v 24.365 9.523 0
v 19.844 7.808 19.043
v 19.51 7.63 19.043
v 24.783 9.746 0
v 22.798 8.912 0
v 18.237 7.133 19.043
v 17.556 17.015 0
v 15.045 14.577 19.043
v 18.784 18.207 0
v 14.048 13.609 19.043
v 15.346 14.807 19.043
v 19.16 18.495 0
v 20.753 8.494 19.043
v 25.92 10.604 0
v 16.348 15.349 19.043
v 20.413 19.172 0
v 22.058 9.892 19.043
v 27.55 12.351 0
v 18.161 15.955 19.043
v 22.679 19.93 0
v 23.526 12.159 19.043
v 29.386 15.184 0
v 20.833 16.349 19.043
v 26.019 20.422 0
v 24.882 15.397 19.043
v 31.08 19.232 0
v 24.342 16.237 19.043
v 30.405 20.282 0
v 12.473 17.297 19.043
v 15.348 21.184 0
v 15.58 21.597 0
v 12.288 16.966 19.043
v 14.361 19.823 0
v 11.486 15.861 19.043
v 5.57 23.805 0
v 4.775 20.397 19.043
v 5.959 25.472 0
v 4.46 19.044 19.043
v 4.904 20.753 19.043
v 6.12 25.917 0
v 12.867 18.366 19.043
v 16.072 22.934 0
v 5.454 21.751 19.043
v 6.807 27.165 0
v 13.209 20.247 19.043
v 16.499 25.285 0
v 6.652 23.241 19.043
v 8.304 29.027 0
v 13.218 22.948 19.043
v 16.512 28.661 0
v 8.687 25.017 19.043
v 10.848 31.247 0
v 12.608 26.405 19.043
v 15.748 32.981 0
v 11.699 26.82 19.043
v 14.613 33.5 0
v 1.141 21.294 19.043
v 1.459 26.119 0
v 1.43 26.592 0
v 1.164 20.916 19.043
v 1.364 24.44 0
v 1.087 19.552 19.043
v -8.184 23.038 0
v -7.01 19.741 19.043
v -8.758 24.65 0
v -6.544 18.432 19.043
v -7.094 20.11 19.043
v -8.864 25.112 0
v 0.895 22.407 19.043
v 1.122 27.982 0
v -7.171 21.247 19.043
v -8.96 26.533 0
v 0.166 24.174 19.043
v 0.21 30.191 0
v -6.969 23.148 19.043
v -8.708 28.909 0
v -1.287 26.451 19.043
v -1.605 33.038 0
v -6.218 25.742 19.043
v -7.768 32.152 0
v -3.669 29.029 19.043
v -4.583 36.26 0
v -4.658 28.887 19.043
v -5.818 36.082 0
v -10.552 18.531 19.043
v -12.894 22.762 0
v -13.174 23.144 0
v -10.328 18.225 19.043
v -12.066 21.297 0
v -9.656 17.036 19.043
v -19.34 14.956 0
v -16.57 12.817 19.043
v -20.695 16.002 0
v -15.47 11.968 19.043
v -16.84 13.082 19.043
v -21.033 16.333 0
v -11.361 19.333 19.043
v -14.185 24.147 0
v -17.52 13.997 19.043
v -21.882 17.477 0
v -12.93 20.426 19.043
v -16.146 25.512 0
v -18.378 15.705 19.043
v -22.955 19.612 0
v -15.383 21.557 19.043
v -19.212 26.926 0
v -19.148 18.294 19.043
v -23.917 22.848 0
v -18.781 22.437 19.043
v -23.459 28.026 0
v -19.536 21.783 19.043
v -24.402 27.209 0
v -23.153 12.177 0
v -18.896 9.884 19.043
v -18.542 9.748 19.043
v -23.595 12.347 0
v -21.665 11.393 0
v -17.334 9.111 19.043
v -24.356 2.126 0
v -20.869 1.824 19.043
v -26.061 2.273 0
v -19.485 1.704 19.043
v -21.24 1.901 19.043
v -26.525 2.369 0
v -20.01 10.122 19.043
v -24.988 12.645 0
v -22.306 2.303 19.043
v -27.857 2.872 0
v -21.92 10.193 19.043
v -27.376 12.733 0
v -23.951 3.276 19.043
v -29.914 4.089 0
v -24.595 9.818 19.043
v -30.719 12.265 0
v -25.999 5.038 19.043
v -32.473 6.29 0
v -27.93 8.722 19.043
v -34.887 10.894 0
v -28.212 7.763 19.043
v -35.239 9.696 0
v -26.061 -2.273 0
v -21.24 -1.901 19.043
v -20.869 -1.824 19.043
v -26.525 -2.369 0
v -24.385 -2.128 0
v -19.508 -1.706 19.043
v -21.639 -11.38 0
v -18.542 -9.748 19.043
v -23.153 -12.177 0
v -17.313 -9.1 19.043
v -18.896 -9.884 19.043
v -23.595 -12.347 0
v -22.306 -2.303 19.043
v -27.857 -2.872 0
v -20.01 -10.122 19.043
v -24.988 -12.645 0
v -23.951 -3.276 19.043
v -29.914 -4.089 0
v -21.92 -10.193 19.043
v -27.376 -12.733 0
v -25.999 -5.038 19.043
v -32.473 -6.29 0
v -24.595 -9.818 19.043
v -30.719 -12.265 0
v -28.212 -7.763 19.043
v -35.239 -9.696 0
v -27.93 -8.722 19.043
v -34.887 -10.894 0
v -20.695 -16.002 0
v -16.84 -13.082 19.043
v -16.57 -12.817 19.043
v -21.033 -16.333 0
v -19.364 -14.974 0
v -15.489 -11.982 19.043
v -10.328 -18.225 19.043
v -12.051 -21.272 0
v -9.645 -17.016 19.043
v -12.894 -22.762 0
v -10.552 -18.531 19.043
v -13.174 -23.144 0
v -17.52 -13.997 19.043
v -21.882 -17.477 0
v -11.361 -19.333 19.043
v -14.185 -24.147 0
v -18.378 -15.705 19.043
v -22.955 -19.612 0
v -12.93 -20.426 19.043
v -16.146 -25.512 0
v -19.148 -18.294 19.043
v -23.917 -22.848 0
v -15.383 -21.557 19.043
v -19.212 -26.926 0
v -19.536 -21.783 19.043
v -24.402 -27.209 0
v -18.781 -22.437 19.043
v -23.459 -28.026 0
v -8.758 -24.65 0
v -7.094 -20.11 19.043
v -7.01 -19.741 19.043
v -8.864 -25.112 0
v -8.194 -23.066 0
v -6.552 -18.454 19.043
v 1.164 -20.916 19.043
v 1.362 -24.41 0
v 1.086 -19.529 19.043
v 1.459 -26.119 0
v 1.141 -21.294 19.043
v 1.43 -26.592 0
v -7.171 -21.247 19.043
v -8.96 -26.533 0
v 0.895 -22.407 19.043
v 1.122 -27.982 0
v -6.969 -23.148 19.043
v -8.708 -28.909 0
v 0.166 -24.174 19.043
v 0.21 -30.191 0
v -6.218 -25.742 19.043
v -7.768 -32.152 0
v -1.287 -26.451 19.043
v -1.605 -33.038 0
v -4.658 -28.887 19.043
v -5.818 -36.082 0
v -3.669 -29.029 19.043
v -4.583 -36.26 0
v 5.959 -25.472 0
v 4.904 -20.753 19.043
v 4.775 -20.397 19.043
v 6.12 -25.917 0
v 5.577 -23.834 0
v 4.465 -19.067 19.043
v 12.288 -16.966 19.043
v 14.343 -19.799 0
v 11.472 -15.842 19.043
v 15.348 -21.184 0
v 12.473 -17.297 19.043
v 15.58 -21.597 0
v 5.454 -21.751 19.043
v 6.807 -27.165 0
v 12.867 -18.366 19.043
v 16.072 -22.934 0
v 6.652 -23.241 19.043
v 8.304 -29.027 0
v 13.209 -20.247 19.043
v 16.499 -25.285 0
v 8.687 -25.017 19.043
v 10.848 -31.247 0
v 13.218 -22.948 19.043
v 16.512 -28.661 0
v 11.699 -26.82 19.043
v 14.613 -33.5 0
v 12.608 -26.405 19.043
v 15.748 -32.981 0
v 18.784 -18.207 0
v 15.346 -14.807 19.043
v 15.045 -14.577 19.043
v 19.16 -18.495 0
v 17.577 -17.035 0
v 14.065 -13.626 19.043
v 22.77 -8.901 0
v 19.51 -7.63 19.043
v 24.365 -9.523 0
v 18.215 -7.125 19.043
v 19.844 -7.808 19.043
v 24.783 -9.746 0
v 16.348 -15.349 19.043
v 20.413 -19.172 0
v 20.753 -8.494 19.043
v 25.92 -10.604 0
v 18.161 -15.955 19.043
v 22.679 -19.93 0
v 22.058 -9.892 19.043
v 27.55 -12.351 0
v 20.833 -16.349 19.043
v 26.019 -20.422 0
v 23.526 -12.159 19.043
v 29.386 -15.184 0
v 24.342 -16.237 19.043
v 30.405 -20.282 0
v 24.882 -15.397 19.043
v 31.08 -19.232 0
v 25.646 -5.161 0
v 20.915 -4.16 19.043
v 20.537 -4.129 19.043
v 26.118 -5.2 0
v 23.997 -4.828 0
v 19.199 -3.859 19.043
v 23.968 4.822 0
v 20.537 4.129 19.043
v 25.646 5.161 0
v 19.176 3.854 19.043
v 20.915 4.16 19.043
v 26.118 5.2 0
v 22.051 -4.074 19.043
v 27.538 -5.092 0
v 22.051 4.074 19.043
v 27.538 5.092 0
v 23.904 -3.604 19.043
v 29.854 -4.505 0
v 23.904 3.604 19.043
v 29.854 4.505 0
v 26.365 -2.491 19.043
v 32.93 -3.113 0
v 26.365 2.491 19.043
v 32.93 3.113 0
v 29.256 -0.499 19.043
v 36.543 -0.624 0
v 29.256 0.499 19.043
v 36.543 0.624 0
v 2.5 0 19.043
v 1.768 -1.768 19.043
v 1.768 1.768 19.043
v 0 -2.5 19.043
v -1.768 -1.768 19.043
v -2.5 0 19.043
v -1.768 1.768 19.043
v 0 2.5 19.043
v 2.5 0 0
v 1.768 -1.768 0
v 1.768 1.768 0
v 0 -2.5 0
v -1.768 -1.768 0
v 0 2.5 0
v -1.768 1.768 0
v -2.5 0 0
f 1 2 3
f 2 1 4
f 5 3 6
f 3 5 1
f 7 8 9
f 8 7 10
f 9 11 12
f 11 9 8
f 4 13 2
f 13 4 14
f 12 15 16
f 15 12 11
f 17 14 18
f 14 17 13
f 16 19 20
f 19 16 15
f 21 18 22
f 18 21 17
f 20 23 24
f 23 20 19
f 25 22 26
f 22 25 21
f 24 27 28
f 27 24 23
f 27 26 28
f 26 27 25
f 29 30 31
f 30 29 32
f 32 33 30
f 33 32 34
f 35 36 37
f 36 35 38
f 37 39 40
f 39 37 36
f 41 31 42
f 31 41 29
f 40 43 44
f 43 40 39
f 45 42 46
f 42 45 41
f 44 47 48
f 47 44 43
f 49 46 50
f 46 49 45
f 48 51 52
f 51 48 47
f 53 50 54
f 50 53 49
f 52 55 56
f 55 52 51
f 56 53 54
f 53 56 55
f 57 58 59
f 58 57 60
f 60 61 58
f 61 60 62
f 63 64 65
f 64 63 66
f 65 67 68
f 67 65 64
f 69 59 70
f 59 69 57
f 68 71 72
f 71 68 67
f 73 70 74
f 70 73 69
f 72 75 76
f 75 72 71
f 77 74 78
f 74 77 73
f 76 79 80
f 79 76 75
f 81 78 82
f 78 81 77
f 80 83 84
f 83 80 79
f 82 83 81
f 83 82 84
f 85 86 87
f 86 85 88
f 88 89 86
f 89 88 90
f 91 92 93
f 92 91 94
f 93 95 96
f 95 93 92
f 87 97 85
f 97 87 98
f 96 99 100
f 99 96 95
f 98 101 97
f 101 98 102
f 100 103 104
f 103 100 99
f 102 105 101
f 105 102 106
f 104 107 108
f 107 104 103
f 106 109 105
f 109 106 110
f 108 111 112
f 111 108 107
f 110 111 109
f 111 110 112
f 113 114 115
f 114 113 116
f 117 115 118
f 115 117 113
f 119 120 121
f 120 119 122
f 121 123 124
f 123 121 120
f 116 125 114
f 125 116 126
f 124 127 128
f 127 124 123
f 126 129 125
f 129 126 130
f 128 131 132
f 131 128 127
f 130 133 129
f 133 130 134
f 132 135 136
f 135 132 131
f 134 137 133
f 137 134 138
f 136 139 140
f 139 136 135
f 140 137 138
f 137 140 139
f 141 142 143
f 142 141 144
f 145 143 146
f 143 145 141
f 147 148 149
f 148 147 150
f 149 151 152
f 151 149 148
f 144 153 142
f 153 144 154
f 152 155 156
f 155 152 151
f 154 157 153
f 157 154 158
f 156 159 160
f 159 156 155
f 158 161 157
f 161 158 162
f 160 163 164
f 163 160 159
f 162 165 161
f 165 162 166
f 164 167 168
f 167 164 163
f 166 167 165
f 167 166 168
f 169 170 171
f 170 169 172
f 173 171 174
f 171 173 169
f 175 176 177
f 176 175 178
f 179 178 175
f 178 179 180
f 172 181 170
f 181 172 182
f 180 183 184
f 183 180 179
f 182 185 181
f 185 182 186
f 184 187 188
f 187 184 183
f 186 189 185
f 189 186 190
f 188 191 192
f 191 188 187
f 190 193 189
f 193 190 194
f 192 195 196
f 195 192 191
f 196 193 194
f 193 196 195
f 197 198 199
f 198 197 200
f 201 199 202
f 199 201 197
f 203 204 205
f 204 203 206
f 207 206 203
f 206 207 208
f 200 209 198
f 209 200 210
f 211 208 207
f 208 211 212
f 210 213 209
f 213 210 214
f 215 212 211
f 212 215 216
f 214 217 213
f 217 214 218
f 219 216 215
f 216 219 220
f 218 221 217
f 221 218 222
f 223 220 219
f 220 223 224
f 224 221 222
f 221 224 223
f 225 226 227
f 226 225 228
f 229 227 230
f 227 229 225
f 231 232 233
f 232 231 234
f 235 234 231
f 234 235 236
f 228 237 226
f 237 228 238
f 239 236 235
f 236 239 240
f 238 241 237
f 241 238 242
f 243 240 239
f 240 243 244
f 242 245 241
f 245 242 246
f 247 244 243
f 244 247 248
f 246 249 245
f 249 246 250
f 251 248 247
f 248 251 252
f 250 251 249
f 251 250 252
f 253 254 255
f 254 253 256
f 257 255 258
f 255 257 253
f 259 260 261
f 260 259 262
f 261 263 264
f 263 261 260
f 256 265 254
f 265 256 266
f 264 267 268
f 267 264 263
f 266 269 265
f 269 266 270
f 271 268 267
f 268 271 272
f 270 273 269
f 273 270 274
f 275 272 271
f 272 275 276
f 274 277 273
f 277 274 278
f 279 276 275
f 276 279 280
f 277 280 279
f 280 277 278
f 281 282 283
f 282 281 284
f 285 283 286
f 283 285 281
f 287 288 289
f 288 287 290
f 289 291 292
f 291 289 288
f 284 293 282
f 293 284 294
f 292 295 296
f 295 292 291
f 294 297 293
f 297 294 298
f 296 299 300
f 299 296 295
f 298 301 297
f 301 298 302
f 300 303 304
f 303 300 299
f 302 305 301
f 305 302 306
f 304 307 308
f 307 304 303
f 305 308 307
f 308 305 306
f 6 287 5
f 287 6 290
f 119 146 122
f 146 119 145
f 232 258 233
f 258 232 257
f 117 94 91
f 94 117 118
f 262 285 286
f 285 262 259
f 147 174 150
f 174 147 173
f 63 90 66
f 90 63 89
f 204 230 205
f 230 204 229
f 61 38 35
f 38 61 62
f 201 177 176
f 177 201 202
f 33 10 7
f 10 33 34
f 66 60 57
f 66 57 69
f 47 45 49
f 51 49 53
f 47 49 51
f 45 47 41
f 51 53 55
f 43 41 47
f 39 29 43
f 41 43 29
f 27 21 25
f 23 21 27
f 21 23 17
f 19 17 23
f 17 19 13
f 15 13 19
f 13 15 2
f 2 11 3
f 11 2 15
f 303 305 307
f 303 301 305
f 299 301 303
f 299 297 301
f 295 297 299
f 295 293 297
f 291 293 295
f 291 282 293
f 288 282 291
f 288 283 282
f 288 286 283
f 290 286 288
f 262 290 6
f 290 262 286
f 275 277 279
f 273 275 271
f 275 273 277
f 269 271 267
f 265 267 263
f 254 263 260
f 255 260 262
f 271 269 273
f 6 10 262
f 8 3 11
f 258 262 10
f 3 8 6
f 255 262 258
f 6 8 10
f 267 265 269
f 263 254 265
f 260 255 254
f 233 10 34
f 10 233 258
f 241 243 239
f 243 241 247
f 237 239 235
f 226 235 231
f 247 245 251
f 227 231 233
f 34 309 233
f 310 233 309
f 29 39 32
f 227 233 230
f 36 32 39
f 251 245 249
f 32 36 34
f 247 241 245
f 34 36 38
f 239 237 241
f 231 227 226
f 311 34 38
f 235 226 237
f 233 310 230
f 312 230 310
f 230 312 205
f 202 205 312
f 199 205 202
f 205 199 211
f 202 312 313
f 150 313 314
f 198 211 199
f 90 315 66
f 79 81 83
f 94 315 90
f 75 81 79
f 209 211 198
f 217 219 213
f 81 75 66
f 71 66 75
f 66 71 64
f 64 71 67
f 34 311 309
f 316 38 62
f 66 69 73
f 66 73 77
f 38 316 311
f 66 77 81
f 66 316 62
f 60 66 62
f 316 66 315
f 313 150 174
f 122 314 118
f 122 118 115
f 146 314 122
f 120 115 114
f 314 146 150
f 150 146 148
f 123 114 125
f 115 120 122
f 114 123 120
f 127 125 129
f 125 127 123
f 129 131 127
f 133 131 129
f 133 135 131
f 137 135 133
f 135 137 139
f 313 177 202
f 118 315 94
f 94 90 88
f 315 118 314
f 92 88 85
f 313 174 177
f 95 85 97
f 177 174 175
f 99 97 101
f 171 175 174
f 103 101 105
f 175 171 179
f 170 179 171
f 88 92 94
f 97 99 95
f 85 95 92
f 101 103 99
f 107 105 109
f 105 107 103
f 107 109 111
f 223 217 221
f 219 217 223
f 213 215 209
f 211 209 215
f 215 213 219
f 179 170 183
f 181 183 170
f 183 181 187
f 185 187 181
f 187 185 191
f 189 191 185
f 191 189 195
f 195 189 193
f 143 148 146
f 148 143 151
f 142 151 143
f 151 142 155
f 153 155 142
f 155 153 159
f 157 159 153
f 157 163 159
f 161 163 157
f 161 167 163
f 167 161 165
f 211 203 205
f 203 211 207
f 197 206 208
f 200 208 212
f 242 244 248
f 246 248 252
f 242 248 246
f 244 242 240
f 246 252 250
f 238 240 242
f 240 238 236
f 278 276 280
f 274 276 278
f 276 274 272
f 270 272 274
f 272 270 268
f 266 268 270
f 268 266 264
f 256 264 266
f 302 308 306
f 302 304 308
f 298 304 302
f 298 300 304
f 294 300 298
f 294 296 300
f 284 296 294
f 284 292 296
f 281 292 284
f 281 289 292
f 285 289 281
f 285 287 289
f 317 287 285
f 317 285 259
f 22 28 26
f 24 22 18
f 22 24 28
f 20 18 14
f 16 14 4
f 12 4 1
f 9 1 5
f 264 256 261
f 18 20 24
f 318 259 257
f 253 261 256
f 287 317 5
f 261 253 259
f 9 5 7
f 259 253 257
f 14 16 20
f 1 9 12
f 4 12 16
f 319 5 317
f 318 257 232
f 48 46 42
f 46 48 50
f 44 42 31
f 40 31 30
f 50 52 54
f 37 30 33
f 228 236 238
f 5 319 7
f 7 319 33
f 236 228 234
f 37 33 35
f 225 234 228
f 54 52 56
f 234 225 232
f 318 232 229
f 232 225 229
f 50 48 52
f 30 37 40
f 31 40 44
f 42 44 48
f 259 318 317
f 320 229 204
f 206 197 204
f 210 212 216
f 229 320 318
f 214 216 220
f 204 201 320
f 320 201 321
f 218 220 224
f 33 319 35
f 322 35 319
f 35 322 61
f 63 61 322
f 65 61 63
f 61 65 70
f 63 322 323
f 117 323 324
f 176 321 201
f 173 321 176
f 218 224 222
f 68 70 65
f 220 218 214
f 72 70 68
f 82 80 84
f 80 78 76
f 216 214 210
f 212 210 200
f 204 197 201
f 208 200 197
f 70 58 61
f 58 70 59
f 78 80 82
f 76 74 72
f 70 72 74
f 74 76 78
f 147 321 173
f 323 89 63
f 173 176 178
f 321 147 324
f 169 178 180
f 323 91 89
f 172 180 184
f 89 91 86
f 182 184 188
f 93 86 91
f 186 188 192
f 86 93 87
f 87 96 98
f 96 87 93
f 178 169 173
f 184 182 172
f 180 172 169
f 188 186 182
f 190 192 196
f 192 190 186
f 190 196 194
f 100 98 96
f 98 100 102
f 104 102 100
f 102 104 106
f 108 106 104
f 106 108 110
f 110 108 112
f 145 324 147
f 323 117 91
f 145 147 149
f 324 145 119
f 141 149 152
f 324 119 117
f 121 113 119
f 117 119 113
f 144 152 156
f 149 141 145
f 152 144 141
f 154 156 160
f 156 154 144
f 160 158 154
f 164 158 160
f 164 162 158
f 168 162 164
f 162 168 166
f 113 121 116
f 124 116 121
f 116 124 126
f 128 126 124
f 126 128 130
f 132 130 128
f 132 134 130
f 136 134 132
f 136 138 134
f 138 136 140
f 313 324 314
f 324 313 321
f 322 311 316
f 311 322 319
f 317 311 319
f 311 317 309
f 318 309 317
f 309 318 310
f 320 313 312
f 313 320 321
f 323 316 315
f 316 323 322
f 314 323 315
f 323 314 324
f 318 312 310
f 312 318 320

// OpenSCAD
// Parametric Involute Bevel and Spur Gears by GregFrost
// It is licensed under the Creative Commons - GNU LGPL 2.1 license.
// © 2010 by GregFrost, thingiverse.com/Amp
// http://www.thingiverse.com/thing:3575 and http://www.thingiverse.com/thing:3752

// Simple Test:
//gear (circular_pitch=700,
//	gear_thickness = 12,
//	rim_thickness = 15,
//	hub_thickness = 17,
//	circles=8);

//Complex Spur Gear Test:
//test_gears ();

// Meshing Double Helix:
//test_meshing_double_helix ();

module test_meshing_double_helix(){
    meshing_double_helix ();
}

// Demonstrate the backlash option for Spur gears.
//test_backlash ();

// Demonstrate how to make meshing bevel gears.
//test_bevel_gear_pair();

module test_bevel_gear_pair(){
    bevel_gear_pair ();
}

//test_bevel_gear_pair();

module test_bevel_gear(){bevel_gear();}

bevel_gear();

pi=3.1415926535897932384626433832795;

//==================================================
// Bevel Gears:
// Two gears with the same cone distance, circular pitch (measured at the cone distance)
// and pressure angle will mesh.

module bevel_gear_pair (
	gear1_teeth = 41,
	gear2_teeth = 7,
	axis_angle = 90,
	outside_circular_pitch=1000)
{
	outside_pitch_radius1 = gear1_teeth * outside_circular_pitch / 360;
	outside_pitch_radius2 = gear2_teeth * outside_circular_pitch / 360;
	pitch_apex1=outside_pitch_radius2 * sin (axis_angle) +
		(outside_pitch_radius2 * cos (axis_angle) + outside_pitch_radius1) / tan (axis_angle);
	cone_distance = sqrt (pow (pitch_apex1, 2) + pow (outside_pitch_radius1, 2));
	pitch_apex2 = sqrt (pow (cone_distance, 2) - pow (outside_pitch_radius2, 2));
	echo ("cone_distance", cone_distance);
	pitch_angle1 = asin (outside_pitch_radius1 / cone_distance);
	pitch_angle2 = asin (outside_pitch_radius2 / cone_distance);
	echo ("pitch_angle1, pitch_angle2", pitch_angle1, pitch_angle2);
	echo ("pitch_angle1 + pitch_angle2", pitch_angle1 + pitch_angle2);

	rotate([0,0,90])
	translate ([0,0,pitch_apex1+20])
	{
		translate([0,0,-pitch_apex1])
		bevel_gear (
			number_of_teeth=gear1_teeth,
			cone_distance=cone_distance,
			pressure_angle=30,
			outside_circular_pitch=outside_circular_pitch);

		rotate([0,-(pitch_angle1+pitch_angle2),0])
		translate([0,0,-pitch_apex2])
		bevel_gear (
			number_of_teeth=gear2_teeth,
			cone_distance=cone_distance,
			pressure_angle=30,
			outside_circular_pitch=outside_circular_pitch);
	}
}

//Bevel Gear Finishing Options:
bevel_gear_flat = 0;
bevel_gear_back_cone = 1;

module bevel_gear (
	number_of_teeth=11,
	cone_distance=100,
	face_width=20,
	outside_circular_pitch=1000,
	pressure_angle=30,
	clearance = 0.2,
	bore_diameter=5,
	gear_thickness = 15,
	backlash = 0,
	involute_facets=0,
	finish = -1)
{
	echo ("bevel_gear",
		"teeth", number_of_teeth,
		"cone distance", cone_distance,
		face_width,
		outside_circular_pitch,
		pressure_angle,
		clearance,
		bore_diameter,
		involute_facets,
		finish);

	// Pitch diameter: Diameter of pitch circle at the fat end of the gear.
	outside_pitch_diameter  =  number_of_teeth * outside_circular_pitch / 180;
	outside_pitch_radius = outside_pitch_diameter / 2;

	// The height of the pitch apex.
	pitch_apex = sqrt (pow (cone_distance, 2) - pow (outside_pitch_radius, 2));
	pitch_angle = asin (outside_pitch_radius/cone_distance);

	echo ("Num Teeth:", number_of_teeth, " Pitch Angle:", pitch_angle);

	finish = (finish != -1) ? finish : (pitch_angle < 45) ? bevel_gear_flat : bevel_gear_back_cone;

	apex_to_apex=cone_distance / cos (pitch_angle);
	back_cone_radius = apex_to_apex * sin (pitch_angle);

	// Calculate and display the pitch angle. This is needed to determine the angle to mount two meshing cone gears.

	// Base Circle for forming the involute teeth shape.
	base_radius = back_cone_radius * cos (pressure_angle);

	// Diametrial pitch: Number of teeth per unit length.
	pitch_diametrial = number_of_teeth / outside_pitch_diameter;

	// Addendum: Radial distance from pitch circle to outside circle.
	addendum = 1 / pitch_diametrial;
	// Outer Circle
	outer_radius = back_cone_radius + addendum;

	// Dedendum: Radial distance from pitch circle to root diameter
	dedendum = addendum + clearance;
	dedendum_angle = atan (dedendum / cone_distance);
	root_angle = pitch_angle - dedendum_angle;

	root_cone_full_radius = tan (root_angle)*apex_to_apex;
	back_cone_full_radius=apex_to_apex / tan (pitch_angle);

	back_cone_end_radius =
		outside_pitch_radius -
		dedendum * cos (pitch_angle) -
		gear_thickness / tan (pitch_angle);
	back_cone_descent = dedendum * sin (pitch_angle) + gear_thickness;

	// Root diameter: Diameter of bottom of tooth spaces.
	root_radius = back_cone_radius - dedendum;

	half_tooth_thickness = outside_pitch_radius * sin (360 / (4 * number_of_teeth)) - backlash / 4;
	half_thick_angle = asin (half_tooth_thickness / back_cone_radius);

	face_cone_height = apex_to_apex-face_width / cos (pitch_angle);
	face_cone_full_radius = face_cone_height / tan (pitch_angle);
	face_cone_descent = dedendum * sin (pitch_angle);
	face_cone_end_radius =
		outside_pitch_radius -
		face_width / sin (pitch_angle) -
		face_cone_descent / tan (pitch_angle);

	// For the bevel_gear_flat finish option, calculate the height of a cube to select the portion of the gear that includes the full pitch face.
	bevel_gear_flat_height = pitch_apex - (cone_distance - face_width) * cos (pitch_angle);

//	translate([0,0,-pitch_apex])
	difference ()
	{
		intersection ()
		{
			union()
			{
				rotate (half_thick_angle)
				translate ([0,0,pitch_apex-apex_to_apex])
				cylinder ($fn=number_of_teeth*2, r1=root_cone_full_radius,r2=0,h=apex_to_apex);
				for (i = [1:number_of_teeth])
//				for (i = [1:1])
				{
					rotate ([0,0,i*360/number_of_teeth])
					{
						involute_bevel_gear_tooth (
							back_cone_radius = back_cone_radius,
							root_radius = root_radius,
							base_radius = base_radius,
							outer_radius = outer_radius,
							pitch_apex = pitch_apex,
							cone_distance = cone_distance,
							half_thick_angle = half_thick_angle,
							involute_facets = involute_facets);
					}
				}
			}

			if (finish == bevel_gear_back_cone)
			{
				translate ([0,0,-back_cone_descent])
				cylinder (
					$fn=number_of_teeth*2,
					r1=back_cone_end_radius,
					r2=back_cone_full_radius*2,
					h=apex_to_apex + back_cone_descent);
			}
			else
			{
				translate ([-1.5*outside_pitch_radius,-1.5*outside_pitch_radius,0])
				cube ([3*outside_pitch_radius,
					3*outside_pitch_radius,
					bevel_gear_flat_height]);
			}
		}

		if (finish == bevel_gear_back_cone)
		{
			translate ([0,0,-face_cone_descent])
			cylinder (
				r1=face_cone_end_radius,
				r2=face_cone_full_radius * 2,
				h=face_cone_height + face_cone_descent+pitch_apex);
		}

		translate ([0,0,pitch_apex - apex_to_apex])
		cylinder (r=bore_diameter/2,h=apex_to_apex);
	}
}

module involute_bevel_gear_tooth (
	back_cone_radius,
	root_radius,
	base_radius,
	outer_radius,
	pitch_apex,
	cone_distance,
	half_thick_angle,
	involute_facets)
{
//	echo ("involute_bevel_gear_tooth",
//		back_cone_radius,
//		root_radius,
//		base_radius,
//		outer_radius,
//		pitch_apex,
//		cone_distance,
//		half_thick_angle);

	min_radius = max (base_radius*2,root_radius*2);

	pitch_point =
		involute (
			base_radius*2,
			involute_intersect_angle (base_radius*2, back_cone_radius*2));
	pitch_angle = atan2 (pitch_point[1], pitch_point[0]);
	centre_angle = pitch_angle + half_thick_angle;

	start_angle = involute_intersect_angle (base_radius*2, min_radius);
	stop_angle = involute_intersect_angle (base_radius*2, outer_radius*2);

	res=(involute_facets!=0)?involute_facets:($fn==0)?5:$fn/4;

	translate ([0,0,pitch_apex])
	rotate ([0,-atan(back_cone_radius/cone_distance),0])
	translate ([-back_cone_radius*2,0,-cone_distance*2])
	union ()
	{
		for (i=[1:res])
		{
			assign (
				point1=
					involute (base_radius*2,start_angle+(stop_angle - start_angle)*(i-1)/res),
				point2=
					involute (base_radius*2,start_angle+(stop_angle - start_angle)*(i)/res))
			{
				assign (
					side1_point1 = rotate_point (centre_angle, point1),
					side1_point2 = rotate_point (centre_angle, point2),
					side2_point1 = mirror_point (rotate_point (centre_angle, point1)),
					side2_point2 = mirror_point (rotate_point (centre_angle, point2)))
				{
					polyhedron (
						points=[
							[back_cone_radius*2+0.1,0,cone_distance*2],
							[side1_point1[0],side1_point1[1],0],
							[side1_point2[0],side1_point2[1],0],
							[side2_point2[0],side2_point2[1],0],
							[side2_point1[0],side2_point1[1],0],
							[0.1,0,0]],
						triangles=[[0,2,1],[0,3,2],[0,4,3],[0,1,5],[1,2,5],[2,3,5],[3,4,5],[0,5,4]]);
				}
			}
		}
	}
}

module gear (
	number_of_teeth=15,
	circular_pitch=false, diametral_pitch=false,
	pressure_angle=28,
	clearance = 0.2,
	gear_thickness=5,
	rim_thickness=8,
	rim_width=5,
	hub_thickness=10,
	hub_diameter=15,
	bore_diameter=5,
	circles=0,
	backlash=0,
	twist=0,
	involute_facets=0,
	flat=false)
{
	if (circular_pitch==false && diametral_pitch==false)
		echo("MCAD ERROR: gear module needs either a diametral_pitch or circular_pitch");

	//Convert diametrial pitch to our native circular pitch
	circular_pitch = (circular_pitch!=false?circular_pitch:180/diametral_pitch);

	// Pitch diameter: Diameter of pitch circle.
	pitch_diameter  =  number_of_teeth * circular_pitch / 180;
	pitch_radius = pitch_diameter/2;
	echo ("Teeth:", number_of_teeth, " Pitch radius:", pitch_radius);

	// Base Circle
	base_radius = pitch_radius*cos(pressure_angle);

	// Diametrial pitch: Number of teeth per unit length.
	pitch_diametrial = number_of_teeth / pitch_diameter;

	// Addendum: Radial distance from pitch circle to outside circle.
	addendum = 1/pitch_diametrial;

	//Outer Circle
	outer_radius = pitch_radius+addendum;

	// Dedendum: Radial distance from pitch circle to root diameter
	dedendum = addendum + clearance;

	// Root diameter: Diameter of bottom of tooth spaces.
	root_radius = pitch_radius-dedendum;
	backlash_angle = backlash / pitch_radius * 180 / pi;
	half_thick_angle = (360 / number_of_teeth - backlash_angle) / 4;

	// Variables controlling the rim.
	rim_radius = root_radius - rim_width;

	// Variables controlling the circular holes in the gear.
	circle_orbit_diameter=hub_diameter/2+rim_radius;
	circle_orbit_curcumference=pi*circle_orbit_diameter;

	// Limit the circle size to 90% of the gear face.
	circle_diameter=
		min (
			0.70*circle_orbit_curcumference/circles,
			(rim_radius-hub_diameter/2)*0.9);

	difference()
	{
		union ()
		{
			difference ()
			{
				linear_exturde_flat_option(flat=flat, height=rim_thickness, convexity=10, twist=twist)
				gear_shape (
					number_of_teeth,
					pitch_radius = pitch_radius,
					root_radius = root_radius,
					base_radius = base_radius,
					outer_radius = outer_radius,
					half_thick_angle = half_thick_angle,
					involute_facets=involute_facets);

				if (gear_thickness < rim_thickness)
					translate ([0,0,gear_thickness])
					cylinder (r=rim_radius,h=rim_thickness-gear_thickness+1);
			}
			if (gear_thickness > rim_thickness)
				linear_exturde_flat_option(flat=flat, height=gear_thickness)
				circle (r=rim_radius);
			if (flat == false && hub_thickness > gear_thickness)
				translate ([0,0,gear_thickness])
				linear_exturde_flat_option(flat=flat, height=hub_thickness-gear_thickness)
				circle (r=hub_diameter/2);
		}
		translate ([0,0,-1])
		linear_exturde_flat_option(flat =flat, height=2+max(rim_thickness,hub_thickness,gear_thickness))
		circle (r=bore_diameter/2);
		if (circles>0)
		{
			for(i=[0:circles-1])
				rotate([0,0,i*360/circles])
				translate([circle_orbit_diameter/2,0,-1])
				linear_exturde_flat_option(flat =flat, height=max(gear_thickness,rim_thickness)+3)
				circle(r=circle_diameter/2);
		}
	}
}

module linear_exturde_flat_option(flat =false, height = 10, center = false, convexity = 2, twist = 0)
{
	if(flat==false)
	{
		linear_extrude(height = height, center = center, convexity = convexity, twist= twist) child(0);
	}
	else
	{
		child(0);
	}

}

module gear_shape (
	number_of_teeth,
	pitch_radius,
	root_radius,
	base_radius,
	outer_radius,
	half_thick_angle,
	involute_facets)
{
	union()
	{
		rotate (half_thick_angle) circle ($fn=number_of_teeth*2, r=root_radius);

		for (i = [1:number_of_teeth])
		{
			rotate ([0,0,i*360/number_of_teeth])
			{
				involute_gear_tooth (
					pitch_radius = pitch_radius,
					root_radius = root_radius,
					base_radius = base_radius,
					outer_radius = outer_radius,
					half_thick_angle = half_thick_angle,
					involute_facets=involute_facets);
			}
		}
	}
}

module involute_gear_tooth (
	pitch_radius,
	root_radius,
	base_radius,
	outer_radius,
	half_thick_angle,
	involute_facets)
{
	min_radius = max (base_radius,root_radius);

	pitch_point = involute (base_radius, involute_intersect_angle (base_radius, pitch_radius));
	pitch_angle = atan2 (pitch_point[1], pitch_point[0]);
	centre_angle = pitch_angle + half_thick_angle;

	start_angle = involute_intersect_angle (base_radius, min_radius);
	stop_angle = involute_intersect_angle (base_radius, outer_radius);

	res=(involute_facets!=0)?involute_facets:($fn==0)?5:$fn/4;

	union ()
	{
		for (i=[1:res])
		assign (
			point1=involute (base_radius,start_angle+(stop_angle - start_angle)*(i-1)/res),
			point2=involute (base_radius,start_angle+(stop_angle - start_angle)*i/res))
		{
			assign (
				side1_point1=rotate_point (centre_angle, point1),
				side1_point2=rotate_point (centre_angle, point2),
				side2_point1=mirror_point (rotate_point (centre_angle, point1)),
				side2_point2=mirror_point (rotate_point (centre_angle, point2)))
			{
				polygon (
					points=[[0,0],side1_point1,side1_point2,side2_point2,side2_point1],
					paths=[[0,1,2,3,4,0]]);
			}
		}
	}
}

// Mathematical Functions
//===============

// Finds the angle of the involute about the base radius at the given distance (radius) from it's center.
//source: http://www.mathhelpforum.com/math-help/geometry/136011-circle-involute-solving-y-any-given-x.html

function involute_intersect_angle (base_radius, radius) = sqrt (pow (radius/base_radius, 2) - 1) * 180 / pi;

// Calculate the involute position for a given base radius and involute angle.

function rotated_involute (rotate, base_radius, involute_angle) =
[
	cos (rotate) * involute (base_radius, involute_angle)[0] + sin (rotate) * involute (base_radius, involute_angle)[1],
	cos (rotate) * involute (base_radius, involute_angle)[1] - sin (rotate) * involute (base_radius, involute_angle)[0]
];

function mirror_point (coord) =
[
	coord[0],
	-coord[1]
];

function rotate_point (rotate, coord) =
[
	cos (rotate) * coord[0] + sin (rotate) * coord[1],
	cos (rotate) * coord[1] - sin (rotate) * coord[0]
];

function involute (base_radius, involute_angle) =
[
	base_radius*(cos (involute_angle) + involute_angle*pi/180*sin (involute_angle)),
	base_radius*(sin (involute_angle) - involute_angle*pi/180*cos (involute_angle))
];


// Test Cases
//===============

module test_gears()
{
	translate([17,-15])
	{
		gear (number_of_teeth=17,
			circular_pitch=500,
			circles=8);

		rotate ([0,0,360*4/17])
		translate ([39.088888,0,0])
		{
			gear (number_of_teeth=11,
				circular_pitch=500,
				hub_diameter=0,
				rim_width=65);
			translate ([0,0,8])
			{
				gear (number_of_teeth=6,
					circular_pitch=300,
					hub_diameter=0,
					rim_width=5,
					rim_thickness=6,
					pressure_angle=31);
				rotate ([0,0,360*5/6])
				translate ([22.5,0,1])
				gear (number_of_teeth=21,
					circular_pitch=300,
					bore_diameter=2,
					hub_diameter=4,
					rim_width=1,
					hub_thickness=4,
					rim_thickness=4,
					gear_thickness=3,
					pressure_angle=31);
			}
		}

		translate ([-61.1111111,0,0])
		{
			gear (number_of_teeth=27,
				circular_pitch=500,
				circles=5,
				hub_diameter=2*8.88888889);

			translate ([0,0,10])
			{
				gear (
					number_of_teeth=14,
					circular_pitch=200,
					pressure_angle=5,
					clearance = 0.2,
					gear_thickness = 10,
					rim_thickness = 10,
					rim_width = 15,
					bore_diameter=5,
					circles=0);
				translate ([13.8888888,0,1])
				gear (
					number_of_teeth=11,
					circular_pitch=200,
					pressure_angle=5,
					clearance = 0.2,
					gear_thickness = 10,
					rim_thickness = 10,
					rim_width = 15,
					hub_thickness = 20,
					hub_diameter=2*7.222222,
					bore_diameter=5,
					circles=0);
			}
		}

		rotate ([0,0,360*-5/17])
		translate ([44.444444444,0,0])
		gear (number_of_teeth=15,
			circular_pitch=500,
			hub_diameter=10,
			rim_width=5,
			rim_thickness=5,
			gear_thickness=4,
			hub_thickness=6,
			circles=9);

		rotate ([0,0,360*-1/17])
		translate ([30.5555555,0,-1])
		gear (number_of_teeth=5,
			circular_pitch=500,
			hub_diameter=0,
			rim_width=5,
			rim_thickness=10);
	}
}

module meshing_double_helix ()
{
	test_double_helix_gear ();

	mirror ([0,1,0])
	translate ([58.33333333,0,0])
	test_double_helix_gear (teeth=13,circles=6);
}

module test_double_helix_gear (
	teeth=17,
	circles=8)
{
	//double helical gear
	{
		twist=200;
		height=20;
		pressure_angle=30;

		gear (number_of_teeth=teeth,
			circular_pitch=700,
			pressure_angle=pressure_angle,
			clearance = 0.2,
			gear_thickness = height/2*0.5,
			rim_thickness = height/2,
			rim_width = 5,
			hub_thickness = height/2*1.2,
			hub_diameter=15,
			bore_diameter=5,
			circles=circles,
			twist=twist/teeth);
		mirror([0,0,1])
		gear (number_of_teeth=teeth,
			circular_pitch=700,
			pressure_angle=pressure_angle,
			clearance = 0.2,
			gear_thickness = height/2,
			rim_thickness = height/2,
			rim_width = 5,
			hub_thickness = height/2,
			hub_diameter=15,
			bore_diameter=5,
			circles=circles,
			twist=twist/teeth);
	}
}

module test_backlash ()
{
	backlash = 2;
	teeth = 15;

	translate ([-29.166666,0,0])
	{
		translate ([58.3333333,0,0])
		rotate ([0,0,-360/teeth/4])
		gear (
			number_of_teeth = teeth,
			circular_pitch=700,
			gear_thickness = 12,
			rim_thickness = 15,
			rim_width = 5,
			hub_thickness = 17,
			hub_diameter=15,
			bore_diameter=5,
			backlash = 2,
			circles=8);

		rotate ([0,0,360/teeth/4])
		gear (
			number_of_teeth = teeth,
			circular_pitch=700,
			gear_thickness = 12,
			rim_thickness = 15,
			rim_width = 5,
			hub_thickness = 17,
			hub_diameter=15,
			bore_diameter=5,
			backlash = 2,
			circles=8);
	}

	color([0,0,128,0.5])
	translate([0,0,-5])
	cylinder ($fn=20,r=backlash / 4,h=25);
}
